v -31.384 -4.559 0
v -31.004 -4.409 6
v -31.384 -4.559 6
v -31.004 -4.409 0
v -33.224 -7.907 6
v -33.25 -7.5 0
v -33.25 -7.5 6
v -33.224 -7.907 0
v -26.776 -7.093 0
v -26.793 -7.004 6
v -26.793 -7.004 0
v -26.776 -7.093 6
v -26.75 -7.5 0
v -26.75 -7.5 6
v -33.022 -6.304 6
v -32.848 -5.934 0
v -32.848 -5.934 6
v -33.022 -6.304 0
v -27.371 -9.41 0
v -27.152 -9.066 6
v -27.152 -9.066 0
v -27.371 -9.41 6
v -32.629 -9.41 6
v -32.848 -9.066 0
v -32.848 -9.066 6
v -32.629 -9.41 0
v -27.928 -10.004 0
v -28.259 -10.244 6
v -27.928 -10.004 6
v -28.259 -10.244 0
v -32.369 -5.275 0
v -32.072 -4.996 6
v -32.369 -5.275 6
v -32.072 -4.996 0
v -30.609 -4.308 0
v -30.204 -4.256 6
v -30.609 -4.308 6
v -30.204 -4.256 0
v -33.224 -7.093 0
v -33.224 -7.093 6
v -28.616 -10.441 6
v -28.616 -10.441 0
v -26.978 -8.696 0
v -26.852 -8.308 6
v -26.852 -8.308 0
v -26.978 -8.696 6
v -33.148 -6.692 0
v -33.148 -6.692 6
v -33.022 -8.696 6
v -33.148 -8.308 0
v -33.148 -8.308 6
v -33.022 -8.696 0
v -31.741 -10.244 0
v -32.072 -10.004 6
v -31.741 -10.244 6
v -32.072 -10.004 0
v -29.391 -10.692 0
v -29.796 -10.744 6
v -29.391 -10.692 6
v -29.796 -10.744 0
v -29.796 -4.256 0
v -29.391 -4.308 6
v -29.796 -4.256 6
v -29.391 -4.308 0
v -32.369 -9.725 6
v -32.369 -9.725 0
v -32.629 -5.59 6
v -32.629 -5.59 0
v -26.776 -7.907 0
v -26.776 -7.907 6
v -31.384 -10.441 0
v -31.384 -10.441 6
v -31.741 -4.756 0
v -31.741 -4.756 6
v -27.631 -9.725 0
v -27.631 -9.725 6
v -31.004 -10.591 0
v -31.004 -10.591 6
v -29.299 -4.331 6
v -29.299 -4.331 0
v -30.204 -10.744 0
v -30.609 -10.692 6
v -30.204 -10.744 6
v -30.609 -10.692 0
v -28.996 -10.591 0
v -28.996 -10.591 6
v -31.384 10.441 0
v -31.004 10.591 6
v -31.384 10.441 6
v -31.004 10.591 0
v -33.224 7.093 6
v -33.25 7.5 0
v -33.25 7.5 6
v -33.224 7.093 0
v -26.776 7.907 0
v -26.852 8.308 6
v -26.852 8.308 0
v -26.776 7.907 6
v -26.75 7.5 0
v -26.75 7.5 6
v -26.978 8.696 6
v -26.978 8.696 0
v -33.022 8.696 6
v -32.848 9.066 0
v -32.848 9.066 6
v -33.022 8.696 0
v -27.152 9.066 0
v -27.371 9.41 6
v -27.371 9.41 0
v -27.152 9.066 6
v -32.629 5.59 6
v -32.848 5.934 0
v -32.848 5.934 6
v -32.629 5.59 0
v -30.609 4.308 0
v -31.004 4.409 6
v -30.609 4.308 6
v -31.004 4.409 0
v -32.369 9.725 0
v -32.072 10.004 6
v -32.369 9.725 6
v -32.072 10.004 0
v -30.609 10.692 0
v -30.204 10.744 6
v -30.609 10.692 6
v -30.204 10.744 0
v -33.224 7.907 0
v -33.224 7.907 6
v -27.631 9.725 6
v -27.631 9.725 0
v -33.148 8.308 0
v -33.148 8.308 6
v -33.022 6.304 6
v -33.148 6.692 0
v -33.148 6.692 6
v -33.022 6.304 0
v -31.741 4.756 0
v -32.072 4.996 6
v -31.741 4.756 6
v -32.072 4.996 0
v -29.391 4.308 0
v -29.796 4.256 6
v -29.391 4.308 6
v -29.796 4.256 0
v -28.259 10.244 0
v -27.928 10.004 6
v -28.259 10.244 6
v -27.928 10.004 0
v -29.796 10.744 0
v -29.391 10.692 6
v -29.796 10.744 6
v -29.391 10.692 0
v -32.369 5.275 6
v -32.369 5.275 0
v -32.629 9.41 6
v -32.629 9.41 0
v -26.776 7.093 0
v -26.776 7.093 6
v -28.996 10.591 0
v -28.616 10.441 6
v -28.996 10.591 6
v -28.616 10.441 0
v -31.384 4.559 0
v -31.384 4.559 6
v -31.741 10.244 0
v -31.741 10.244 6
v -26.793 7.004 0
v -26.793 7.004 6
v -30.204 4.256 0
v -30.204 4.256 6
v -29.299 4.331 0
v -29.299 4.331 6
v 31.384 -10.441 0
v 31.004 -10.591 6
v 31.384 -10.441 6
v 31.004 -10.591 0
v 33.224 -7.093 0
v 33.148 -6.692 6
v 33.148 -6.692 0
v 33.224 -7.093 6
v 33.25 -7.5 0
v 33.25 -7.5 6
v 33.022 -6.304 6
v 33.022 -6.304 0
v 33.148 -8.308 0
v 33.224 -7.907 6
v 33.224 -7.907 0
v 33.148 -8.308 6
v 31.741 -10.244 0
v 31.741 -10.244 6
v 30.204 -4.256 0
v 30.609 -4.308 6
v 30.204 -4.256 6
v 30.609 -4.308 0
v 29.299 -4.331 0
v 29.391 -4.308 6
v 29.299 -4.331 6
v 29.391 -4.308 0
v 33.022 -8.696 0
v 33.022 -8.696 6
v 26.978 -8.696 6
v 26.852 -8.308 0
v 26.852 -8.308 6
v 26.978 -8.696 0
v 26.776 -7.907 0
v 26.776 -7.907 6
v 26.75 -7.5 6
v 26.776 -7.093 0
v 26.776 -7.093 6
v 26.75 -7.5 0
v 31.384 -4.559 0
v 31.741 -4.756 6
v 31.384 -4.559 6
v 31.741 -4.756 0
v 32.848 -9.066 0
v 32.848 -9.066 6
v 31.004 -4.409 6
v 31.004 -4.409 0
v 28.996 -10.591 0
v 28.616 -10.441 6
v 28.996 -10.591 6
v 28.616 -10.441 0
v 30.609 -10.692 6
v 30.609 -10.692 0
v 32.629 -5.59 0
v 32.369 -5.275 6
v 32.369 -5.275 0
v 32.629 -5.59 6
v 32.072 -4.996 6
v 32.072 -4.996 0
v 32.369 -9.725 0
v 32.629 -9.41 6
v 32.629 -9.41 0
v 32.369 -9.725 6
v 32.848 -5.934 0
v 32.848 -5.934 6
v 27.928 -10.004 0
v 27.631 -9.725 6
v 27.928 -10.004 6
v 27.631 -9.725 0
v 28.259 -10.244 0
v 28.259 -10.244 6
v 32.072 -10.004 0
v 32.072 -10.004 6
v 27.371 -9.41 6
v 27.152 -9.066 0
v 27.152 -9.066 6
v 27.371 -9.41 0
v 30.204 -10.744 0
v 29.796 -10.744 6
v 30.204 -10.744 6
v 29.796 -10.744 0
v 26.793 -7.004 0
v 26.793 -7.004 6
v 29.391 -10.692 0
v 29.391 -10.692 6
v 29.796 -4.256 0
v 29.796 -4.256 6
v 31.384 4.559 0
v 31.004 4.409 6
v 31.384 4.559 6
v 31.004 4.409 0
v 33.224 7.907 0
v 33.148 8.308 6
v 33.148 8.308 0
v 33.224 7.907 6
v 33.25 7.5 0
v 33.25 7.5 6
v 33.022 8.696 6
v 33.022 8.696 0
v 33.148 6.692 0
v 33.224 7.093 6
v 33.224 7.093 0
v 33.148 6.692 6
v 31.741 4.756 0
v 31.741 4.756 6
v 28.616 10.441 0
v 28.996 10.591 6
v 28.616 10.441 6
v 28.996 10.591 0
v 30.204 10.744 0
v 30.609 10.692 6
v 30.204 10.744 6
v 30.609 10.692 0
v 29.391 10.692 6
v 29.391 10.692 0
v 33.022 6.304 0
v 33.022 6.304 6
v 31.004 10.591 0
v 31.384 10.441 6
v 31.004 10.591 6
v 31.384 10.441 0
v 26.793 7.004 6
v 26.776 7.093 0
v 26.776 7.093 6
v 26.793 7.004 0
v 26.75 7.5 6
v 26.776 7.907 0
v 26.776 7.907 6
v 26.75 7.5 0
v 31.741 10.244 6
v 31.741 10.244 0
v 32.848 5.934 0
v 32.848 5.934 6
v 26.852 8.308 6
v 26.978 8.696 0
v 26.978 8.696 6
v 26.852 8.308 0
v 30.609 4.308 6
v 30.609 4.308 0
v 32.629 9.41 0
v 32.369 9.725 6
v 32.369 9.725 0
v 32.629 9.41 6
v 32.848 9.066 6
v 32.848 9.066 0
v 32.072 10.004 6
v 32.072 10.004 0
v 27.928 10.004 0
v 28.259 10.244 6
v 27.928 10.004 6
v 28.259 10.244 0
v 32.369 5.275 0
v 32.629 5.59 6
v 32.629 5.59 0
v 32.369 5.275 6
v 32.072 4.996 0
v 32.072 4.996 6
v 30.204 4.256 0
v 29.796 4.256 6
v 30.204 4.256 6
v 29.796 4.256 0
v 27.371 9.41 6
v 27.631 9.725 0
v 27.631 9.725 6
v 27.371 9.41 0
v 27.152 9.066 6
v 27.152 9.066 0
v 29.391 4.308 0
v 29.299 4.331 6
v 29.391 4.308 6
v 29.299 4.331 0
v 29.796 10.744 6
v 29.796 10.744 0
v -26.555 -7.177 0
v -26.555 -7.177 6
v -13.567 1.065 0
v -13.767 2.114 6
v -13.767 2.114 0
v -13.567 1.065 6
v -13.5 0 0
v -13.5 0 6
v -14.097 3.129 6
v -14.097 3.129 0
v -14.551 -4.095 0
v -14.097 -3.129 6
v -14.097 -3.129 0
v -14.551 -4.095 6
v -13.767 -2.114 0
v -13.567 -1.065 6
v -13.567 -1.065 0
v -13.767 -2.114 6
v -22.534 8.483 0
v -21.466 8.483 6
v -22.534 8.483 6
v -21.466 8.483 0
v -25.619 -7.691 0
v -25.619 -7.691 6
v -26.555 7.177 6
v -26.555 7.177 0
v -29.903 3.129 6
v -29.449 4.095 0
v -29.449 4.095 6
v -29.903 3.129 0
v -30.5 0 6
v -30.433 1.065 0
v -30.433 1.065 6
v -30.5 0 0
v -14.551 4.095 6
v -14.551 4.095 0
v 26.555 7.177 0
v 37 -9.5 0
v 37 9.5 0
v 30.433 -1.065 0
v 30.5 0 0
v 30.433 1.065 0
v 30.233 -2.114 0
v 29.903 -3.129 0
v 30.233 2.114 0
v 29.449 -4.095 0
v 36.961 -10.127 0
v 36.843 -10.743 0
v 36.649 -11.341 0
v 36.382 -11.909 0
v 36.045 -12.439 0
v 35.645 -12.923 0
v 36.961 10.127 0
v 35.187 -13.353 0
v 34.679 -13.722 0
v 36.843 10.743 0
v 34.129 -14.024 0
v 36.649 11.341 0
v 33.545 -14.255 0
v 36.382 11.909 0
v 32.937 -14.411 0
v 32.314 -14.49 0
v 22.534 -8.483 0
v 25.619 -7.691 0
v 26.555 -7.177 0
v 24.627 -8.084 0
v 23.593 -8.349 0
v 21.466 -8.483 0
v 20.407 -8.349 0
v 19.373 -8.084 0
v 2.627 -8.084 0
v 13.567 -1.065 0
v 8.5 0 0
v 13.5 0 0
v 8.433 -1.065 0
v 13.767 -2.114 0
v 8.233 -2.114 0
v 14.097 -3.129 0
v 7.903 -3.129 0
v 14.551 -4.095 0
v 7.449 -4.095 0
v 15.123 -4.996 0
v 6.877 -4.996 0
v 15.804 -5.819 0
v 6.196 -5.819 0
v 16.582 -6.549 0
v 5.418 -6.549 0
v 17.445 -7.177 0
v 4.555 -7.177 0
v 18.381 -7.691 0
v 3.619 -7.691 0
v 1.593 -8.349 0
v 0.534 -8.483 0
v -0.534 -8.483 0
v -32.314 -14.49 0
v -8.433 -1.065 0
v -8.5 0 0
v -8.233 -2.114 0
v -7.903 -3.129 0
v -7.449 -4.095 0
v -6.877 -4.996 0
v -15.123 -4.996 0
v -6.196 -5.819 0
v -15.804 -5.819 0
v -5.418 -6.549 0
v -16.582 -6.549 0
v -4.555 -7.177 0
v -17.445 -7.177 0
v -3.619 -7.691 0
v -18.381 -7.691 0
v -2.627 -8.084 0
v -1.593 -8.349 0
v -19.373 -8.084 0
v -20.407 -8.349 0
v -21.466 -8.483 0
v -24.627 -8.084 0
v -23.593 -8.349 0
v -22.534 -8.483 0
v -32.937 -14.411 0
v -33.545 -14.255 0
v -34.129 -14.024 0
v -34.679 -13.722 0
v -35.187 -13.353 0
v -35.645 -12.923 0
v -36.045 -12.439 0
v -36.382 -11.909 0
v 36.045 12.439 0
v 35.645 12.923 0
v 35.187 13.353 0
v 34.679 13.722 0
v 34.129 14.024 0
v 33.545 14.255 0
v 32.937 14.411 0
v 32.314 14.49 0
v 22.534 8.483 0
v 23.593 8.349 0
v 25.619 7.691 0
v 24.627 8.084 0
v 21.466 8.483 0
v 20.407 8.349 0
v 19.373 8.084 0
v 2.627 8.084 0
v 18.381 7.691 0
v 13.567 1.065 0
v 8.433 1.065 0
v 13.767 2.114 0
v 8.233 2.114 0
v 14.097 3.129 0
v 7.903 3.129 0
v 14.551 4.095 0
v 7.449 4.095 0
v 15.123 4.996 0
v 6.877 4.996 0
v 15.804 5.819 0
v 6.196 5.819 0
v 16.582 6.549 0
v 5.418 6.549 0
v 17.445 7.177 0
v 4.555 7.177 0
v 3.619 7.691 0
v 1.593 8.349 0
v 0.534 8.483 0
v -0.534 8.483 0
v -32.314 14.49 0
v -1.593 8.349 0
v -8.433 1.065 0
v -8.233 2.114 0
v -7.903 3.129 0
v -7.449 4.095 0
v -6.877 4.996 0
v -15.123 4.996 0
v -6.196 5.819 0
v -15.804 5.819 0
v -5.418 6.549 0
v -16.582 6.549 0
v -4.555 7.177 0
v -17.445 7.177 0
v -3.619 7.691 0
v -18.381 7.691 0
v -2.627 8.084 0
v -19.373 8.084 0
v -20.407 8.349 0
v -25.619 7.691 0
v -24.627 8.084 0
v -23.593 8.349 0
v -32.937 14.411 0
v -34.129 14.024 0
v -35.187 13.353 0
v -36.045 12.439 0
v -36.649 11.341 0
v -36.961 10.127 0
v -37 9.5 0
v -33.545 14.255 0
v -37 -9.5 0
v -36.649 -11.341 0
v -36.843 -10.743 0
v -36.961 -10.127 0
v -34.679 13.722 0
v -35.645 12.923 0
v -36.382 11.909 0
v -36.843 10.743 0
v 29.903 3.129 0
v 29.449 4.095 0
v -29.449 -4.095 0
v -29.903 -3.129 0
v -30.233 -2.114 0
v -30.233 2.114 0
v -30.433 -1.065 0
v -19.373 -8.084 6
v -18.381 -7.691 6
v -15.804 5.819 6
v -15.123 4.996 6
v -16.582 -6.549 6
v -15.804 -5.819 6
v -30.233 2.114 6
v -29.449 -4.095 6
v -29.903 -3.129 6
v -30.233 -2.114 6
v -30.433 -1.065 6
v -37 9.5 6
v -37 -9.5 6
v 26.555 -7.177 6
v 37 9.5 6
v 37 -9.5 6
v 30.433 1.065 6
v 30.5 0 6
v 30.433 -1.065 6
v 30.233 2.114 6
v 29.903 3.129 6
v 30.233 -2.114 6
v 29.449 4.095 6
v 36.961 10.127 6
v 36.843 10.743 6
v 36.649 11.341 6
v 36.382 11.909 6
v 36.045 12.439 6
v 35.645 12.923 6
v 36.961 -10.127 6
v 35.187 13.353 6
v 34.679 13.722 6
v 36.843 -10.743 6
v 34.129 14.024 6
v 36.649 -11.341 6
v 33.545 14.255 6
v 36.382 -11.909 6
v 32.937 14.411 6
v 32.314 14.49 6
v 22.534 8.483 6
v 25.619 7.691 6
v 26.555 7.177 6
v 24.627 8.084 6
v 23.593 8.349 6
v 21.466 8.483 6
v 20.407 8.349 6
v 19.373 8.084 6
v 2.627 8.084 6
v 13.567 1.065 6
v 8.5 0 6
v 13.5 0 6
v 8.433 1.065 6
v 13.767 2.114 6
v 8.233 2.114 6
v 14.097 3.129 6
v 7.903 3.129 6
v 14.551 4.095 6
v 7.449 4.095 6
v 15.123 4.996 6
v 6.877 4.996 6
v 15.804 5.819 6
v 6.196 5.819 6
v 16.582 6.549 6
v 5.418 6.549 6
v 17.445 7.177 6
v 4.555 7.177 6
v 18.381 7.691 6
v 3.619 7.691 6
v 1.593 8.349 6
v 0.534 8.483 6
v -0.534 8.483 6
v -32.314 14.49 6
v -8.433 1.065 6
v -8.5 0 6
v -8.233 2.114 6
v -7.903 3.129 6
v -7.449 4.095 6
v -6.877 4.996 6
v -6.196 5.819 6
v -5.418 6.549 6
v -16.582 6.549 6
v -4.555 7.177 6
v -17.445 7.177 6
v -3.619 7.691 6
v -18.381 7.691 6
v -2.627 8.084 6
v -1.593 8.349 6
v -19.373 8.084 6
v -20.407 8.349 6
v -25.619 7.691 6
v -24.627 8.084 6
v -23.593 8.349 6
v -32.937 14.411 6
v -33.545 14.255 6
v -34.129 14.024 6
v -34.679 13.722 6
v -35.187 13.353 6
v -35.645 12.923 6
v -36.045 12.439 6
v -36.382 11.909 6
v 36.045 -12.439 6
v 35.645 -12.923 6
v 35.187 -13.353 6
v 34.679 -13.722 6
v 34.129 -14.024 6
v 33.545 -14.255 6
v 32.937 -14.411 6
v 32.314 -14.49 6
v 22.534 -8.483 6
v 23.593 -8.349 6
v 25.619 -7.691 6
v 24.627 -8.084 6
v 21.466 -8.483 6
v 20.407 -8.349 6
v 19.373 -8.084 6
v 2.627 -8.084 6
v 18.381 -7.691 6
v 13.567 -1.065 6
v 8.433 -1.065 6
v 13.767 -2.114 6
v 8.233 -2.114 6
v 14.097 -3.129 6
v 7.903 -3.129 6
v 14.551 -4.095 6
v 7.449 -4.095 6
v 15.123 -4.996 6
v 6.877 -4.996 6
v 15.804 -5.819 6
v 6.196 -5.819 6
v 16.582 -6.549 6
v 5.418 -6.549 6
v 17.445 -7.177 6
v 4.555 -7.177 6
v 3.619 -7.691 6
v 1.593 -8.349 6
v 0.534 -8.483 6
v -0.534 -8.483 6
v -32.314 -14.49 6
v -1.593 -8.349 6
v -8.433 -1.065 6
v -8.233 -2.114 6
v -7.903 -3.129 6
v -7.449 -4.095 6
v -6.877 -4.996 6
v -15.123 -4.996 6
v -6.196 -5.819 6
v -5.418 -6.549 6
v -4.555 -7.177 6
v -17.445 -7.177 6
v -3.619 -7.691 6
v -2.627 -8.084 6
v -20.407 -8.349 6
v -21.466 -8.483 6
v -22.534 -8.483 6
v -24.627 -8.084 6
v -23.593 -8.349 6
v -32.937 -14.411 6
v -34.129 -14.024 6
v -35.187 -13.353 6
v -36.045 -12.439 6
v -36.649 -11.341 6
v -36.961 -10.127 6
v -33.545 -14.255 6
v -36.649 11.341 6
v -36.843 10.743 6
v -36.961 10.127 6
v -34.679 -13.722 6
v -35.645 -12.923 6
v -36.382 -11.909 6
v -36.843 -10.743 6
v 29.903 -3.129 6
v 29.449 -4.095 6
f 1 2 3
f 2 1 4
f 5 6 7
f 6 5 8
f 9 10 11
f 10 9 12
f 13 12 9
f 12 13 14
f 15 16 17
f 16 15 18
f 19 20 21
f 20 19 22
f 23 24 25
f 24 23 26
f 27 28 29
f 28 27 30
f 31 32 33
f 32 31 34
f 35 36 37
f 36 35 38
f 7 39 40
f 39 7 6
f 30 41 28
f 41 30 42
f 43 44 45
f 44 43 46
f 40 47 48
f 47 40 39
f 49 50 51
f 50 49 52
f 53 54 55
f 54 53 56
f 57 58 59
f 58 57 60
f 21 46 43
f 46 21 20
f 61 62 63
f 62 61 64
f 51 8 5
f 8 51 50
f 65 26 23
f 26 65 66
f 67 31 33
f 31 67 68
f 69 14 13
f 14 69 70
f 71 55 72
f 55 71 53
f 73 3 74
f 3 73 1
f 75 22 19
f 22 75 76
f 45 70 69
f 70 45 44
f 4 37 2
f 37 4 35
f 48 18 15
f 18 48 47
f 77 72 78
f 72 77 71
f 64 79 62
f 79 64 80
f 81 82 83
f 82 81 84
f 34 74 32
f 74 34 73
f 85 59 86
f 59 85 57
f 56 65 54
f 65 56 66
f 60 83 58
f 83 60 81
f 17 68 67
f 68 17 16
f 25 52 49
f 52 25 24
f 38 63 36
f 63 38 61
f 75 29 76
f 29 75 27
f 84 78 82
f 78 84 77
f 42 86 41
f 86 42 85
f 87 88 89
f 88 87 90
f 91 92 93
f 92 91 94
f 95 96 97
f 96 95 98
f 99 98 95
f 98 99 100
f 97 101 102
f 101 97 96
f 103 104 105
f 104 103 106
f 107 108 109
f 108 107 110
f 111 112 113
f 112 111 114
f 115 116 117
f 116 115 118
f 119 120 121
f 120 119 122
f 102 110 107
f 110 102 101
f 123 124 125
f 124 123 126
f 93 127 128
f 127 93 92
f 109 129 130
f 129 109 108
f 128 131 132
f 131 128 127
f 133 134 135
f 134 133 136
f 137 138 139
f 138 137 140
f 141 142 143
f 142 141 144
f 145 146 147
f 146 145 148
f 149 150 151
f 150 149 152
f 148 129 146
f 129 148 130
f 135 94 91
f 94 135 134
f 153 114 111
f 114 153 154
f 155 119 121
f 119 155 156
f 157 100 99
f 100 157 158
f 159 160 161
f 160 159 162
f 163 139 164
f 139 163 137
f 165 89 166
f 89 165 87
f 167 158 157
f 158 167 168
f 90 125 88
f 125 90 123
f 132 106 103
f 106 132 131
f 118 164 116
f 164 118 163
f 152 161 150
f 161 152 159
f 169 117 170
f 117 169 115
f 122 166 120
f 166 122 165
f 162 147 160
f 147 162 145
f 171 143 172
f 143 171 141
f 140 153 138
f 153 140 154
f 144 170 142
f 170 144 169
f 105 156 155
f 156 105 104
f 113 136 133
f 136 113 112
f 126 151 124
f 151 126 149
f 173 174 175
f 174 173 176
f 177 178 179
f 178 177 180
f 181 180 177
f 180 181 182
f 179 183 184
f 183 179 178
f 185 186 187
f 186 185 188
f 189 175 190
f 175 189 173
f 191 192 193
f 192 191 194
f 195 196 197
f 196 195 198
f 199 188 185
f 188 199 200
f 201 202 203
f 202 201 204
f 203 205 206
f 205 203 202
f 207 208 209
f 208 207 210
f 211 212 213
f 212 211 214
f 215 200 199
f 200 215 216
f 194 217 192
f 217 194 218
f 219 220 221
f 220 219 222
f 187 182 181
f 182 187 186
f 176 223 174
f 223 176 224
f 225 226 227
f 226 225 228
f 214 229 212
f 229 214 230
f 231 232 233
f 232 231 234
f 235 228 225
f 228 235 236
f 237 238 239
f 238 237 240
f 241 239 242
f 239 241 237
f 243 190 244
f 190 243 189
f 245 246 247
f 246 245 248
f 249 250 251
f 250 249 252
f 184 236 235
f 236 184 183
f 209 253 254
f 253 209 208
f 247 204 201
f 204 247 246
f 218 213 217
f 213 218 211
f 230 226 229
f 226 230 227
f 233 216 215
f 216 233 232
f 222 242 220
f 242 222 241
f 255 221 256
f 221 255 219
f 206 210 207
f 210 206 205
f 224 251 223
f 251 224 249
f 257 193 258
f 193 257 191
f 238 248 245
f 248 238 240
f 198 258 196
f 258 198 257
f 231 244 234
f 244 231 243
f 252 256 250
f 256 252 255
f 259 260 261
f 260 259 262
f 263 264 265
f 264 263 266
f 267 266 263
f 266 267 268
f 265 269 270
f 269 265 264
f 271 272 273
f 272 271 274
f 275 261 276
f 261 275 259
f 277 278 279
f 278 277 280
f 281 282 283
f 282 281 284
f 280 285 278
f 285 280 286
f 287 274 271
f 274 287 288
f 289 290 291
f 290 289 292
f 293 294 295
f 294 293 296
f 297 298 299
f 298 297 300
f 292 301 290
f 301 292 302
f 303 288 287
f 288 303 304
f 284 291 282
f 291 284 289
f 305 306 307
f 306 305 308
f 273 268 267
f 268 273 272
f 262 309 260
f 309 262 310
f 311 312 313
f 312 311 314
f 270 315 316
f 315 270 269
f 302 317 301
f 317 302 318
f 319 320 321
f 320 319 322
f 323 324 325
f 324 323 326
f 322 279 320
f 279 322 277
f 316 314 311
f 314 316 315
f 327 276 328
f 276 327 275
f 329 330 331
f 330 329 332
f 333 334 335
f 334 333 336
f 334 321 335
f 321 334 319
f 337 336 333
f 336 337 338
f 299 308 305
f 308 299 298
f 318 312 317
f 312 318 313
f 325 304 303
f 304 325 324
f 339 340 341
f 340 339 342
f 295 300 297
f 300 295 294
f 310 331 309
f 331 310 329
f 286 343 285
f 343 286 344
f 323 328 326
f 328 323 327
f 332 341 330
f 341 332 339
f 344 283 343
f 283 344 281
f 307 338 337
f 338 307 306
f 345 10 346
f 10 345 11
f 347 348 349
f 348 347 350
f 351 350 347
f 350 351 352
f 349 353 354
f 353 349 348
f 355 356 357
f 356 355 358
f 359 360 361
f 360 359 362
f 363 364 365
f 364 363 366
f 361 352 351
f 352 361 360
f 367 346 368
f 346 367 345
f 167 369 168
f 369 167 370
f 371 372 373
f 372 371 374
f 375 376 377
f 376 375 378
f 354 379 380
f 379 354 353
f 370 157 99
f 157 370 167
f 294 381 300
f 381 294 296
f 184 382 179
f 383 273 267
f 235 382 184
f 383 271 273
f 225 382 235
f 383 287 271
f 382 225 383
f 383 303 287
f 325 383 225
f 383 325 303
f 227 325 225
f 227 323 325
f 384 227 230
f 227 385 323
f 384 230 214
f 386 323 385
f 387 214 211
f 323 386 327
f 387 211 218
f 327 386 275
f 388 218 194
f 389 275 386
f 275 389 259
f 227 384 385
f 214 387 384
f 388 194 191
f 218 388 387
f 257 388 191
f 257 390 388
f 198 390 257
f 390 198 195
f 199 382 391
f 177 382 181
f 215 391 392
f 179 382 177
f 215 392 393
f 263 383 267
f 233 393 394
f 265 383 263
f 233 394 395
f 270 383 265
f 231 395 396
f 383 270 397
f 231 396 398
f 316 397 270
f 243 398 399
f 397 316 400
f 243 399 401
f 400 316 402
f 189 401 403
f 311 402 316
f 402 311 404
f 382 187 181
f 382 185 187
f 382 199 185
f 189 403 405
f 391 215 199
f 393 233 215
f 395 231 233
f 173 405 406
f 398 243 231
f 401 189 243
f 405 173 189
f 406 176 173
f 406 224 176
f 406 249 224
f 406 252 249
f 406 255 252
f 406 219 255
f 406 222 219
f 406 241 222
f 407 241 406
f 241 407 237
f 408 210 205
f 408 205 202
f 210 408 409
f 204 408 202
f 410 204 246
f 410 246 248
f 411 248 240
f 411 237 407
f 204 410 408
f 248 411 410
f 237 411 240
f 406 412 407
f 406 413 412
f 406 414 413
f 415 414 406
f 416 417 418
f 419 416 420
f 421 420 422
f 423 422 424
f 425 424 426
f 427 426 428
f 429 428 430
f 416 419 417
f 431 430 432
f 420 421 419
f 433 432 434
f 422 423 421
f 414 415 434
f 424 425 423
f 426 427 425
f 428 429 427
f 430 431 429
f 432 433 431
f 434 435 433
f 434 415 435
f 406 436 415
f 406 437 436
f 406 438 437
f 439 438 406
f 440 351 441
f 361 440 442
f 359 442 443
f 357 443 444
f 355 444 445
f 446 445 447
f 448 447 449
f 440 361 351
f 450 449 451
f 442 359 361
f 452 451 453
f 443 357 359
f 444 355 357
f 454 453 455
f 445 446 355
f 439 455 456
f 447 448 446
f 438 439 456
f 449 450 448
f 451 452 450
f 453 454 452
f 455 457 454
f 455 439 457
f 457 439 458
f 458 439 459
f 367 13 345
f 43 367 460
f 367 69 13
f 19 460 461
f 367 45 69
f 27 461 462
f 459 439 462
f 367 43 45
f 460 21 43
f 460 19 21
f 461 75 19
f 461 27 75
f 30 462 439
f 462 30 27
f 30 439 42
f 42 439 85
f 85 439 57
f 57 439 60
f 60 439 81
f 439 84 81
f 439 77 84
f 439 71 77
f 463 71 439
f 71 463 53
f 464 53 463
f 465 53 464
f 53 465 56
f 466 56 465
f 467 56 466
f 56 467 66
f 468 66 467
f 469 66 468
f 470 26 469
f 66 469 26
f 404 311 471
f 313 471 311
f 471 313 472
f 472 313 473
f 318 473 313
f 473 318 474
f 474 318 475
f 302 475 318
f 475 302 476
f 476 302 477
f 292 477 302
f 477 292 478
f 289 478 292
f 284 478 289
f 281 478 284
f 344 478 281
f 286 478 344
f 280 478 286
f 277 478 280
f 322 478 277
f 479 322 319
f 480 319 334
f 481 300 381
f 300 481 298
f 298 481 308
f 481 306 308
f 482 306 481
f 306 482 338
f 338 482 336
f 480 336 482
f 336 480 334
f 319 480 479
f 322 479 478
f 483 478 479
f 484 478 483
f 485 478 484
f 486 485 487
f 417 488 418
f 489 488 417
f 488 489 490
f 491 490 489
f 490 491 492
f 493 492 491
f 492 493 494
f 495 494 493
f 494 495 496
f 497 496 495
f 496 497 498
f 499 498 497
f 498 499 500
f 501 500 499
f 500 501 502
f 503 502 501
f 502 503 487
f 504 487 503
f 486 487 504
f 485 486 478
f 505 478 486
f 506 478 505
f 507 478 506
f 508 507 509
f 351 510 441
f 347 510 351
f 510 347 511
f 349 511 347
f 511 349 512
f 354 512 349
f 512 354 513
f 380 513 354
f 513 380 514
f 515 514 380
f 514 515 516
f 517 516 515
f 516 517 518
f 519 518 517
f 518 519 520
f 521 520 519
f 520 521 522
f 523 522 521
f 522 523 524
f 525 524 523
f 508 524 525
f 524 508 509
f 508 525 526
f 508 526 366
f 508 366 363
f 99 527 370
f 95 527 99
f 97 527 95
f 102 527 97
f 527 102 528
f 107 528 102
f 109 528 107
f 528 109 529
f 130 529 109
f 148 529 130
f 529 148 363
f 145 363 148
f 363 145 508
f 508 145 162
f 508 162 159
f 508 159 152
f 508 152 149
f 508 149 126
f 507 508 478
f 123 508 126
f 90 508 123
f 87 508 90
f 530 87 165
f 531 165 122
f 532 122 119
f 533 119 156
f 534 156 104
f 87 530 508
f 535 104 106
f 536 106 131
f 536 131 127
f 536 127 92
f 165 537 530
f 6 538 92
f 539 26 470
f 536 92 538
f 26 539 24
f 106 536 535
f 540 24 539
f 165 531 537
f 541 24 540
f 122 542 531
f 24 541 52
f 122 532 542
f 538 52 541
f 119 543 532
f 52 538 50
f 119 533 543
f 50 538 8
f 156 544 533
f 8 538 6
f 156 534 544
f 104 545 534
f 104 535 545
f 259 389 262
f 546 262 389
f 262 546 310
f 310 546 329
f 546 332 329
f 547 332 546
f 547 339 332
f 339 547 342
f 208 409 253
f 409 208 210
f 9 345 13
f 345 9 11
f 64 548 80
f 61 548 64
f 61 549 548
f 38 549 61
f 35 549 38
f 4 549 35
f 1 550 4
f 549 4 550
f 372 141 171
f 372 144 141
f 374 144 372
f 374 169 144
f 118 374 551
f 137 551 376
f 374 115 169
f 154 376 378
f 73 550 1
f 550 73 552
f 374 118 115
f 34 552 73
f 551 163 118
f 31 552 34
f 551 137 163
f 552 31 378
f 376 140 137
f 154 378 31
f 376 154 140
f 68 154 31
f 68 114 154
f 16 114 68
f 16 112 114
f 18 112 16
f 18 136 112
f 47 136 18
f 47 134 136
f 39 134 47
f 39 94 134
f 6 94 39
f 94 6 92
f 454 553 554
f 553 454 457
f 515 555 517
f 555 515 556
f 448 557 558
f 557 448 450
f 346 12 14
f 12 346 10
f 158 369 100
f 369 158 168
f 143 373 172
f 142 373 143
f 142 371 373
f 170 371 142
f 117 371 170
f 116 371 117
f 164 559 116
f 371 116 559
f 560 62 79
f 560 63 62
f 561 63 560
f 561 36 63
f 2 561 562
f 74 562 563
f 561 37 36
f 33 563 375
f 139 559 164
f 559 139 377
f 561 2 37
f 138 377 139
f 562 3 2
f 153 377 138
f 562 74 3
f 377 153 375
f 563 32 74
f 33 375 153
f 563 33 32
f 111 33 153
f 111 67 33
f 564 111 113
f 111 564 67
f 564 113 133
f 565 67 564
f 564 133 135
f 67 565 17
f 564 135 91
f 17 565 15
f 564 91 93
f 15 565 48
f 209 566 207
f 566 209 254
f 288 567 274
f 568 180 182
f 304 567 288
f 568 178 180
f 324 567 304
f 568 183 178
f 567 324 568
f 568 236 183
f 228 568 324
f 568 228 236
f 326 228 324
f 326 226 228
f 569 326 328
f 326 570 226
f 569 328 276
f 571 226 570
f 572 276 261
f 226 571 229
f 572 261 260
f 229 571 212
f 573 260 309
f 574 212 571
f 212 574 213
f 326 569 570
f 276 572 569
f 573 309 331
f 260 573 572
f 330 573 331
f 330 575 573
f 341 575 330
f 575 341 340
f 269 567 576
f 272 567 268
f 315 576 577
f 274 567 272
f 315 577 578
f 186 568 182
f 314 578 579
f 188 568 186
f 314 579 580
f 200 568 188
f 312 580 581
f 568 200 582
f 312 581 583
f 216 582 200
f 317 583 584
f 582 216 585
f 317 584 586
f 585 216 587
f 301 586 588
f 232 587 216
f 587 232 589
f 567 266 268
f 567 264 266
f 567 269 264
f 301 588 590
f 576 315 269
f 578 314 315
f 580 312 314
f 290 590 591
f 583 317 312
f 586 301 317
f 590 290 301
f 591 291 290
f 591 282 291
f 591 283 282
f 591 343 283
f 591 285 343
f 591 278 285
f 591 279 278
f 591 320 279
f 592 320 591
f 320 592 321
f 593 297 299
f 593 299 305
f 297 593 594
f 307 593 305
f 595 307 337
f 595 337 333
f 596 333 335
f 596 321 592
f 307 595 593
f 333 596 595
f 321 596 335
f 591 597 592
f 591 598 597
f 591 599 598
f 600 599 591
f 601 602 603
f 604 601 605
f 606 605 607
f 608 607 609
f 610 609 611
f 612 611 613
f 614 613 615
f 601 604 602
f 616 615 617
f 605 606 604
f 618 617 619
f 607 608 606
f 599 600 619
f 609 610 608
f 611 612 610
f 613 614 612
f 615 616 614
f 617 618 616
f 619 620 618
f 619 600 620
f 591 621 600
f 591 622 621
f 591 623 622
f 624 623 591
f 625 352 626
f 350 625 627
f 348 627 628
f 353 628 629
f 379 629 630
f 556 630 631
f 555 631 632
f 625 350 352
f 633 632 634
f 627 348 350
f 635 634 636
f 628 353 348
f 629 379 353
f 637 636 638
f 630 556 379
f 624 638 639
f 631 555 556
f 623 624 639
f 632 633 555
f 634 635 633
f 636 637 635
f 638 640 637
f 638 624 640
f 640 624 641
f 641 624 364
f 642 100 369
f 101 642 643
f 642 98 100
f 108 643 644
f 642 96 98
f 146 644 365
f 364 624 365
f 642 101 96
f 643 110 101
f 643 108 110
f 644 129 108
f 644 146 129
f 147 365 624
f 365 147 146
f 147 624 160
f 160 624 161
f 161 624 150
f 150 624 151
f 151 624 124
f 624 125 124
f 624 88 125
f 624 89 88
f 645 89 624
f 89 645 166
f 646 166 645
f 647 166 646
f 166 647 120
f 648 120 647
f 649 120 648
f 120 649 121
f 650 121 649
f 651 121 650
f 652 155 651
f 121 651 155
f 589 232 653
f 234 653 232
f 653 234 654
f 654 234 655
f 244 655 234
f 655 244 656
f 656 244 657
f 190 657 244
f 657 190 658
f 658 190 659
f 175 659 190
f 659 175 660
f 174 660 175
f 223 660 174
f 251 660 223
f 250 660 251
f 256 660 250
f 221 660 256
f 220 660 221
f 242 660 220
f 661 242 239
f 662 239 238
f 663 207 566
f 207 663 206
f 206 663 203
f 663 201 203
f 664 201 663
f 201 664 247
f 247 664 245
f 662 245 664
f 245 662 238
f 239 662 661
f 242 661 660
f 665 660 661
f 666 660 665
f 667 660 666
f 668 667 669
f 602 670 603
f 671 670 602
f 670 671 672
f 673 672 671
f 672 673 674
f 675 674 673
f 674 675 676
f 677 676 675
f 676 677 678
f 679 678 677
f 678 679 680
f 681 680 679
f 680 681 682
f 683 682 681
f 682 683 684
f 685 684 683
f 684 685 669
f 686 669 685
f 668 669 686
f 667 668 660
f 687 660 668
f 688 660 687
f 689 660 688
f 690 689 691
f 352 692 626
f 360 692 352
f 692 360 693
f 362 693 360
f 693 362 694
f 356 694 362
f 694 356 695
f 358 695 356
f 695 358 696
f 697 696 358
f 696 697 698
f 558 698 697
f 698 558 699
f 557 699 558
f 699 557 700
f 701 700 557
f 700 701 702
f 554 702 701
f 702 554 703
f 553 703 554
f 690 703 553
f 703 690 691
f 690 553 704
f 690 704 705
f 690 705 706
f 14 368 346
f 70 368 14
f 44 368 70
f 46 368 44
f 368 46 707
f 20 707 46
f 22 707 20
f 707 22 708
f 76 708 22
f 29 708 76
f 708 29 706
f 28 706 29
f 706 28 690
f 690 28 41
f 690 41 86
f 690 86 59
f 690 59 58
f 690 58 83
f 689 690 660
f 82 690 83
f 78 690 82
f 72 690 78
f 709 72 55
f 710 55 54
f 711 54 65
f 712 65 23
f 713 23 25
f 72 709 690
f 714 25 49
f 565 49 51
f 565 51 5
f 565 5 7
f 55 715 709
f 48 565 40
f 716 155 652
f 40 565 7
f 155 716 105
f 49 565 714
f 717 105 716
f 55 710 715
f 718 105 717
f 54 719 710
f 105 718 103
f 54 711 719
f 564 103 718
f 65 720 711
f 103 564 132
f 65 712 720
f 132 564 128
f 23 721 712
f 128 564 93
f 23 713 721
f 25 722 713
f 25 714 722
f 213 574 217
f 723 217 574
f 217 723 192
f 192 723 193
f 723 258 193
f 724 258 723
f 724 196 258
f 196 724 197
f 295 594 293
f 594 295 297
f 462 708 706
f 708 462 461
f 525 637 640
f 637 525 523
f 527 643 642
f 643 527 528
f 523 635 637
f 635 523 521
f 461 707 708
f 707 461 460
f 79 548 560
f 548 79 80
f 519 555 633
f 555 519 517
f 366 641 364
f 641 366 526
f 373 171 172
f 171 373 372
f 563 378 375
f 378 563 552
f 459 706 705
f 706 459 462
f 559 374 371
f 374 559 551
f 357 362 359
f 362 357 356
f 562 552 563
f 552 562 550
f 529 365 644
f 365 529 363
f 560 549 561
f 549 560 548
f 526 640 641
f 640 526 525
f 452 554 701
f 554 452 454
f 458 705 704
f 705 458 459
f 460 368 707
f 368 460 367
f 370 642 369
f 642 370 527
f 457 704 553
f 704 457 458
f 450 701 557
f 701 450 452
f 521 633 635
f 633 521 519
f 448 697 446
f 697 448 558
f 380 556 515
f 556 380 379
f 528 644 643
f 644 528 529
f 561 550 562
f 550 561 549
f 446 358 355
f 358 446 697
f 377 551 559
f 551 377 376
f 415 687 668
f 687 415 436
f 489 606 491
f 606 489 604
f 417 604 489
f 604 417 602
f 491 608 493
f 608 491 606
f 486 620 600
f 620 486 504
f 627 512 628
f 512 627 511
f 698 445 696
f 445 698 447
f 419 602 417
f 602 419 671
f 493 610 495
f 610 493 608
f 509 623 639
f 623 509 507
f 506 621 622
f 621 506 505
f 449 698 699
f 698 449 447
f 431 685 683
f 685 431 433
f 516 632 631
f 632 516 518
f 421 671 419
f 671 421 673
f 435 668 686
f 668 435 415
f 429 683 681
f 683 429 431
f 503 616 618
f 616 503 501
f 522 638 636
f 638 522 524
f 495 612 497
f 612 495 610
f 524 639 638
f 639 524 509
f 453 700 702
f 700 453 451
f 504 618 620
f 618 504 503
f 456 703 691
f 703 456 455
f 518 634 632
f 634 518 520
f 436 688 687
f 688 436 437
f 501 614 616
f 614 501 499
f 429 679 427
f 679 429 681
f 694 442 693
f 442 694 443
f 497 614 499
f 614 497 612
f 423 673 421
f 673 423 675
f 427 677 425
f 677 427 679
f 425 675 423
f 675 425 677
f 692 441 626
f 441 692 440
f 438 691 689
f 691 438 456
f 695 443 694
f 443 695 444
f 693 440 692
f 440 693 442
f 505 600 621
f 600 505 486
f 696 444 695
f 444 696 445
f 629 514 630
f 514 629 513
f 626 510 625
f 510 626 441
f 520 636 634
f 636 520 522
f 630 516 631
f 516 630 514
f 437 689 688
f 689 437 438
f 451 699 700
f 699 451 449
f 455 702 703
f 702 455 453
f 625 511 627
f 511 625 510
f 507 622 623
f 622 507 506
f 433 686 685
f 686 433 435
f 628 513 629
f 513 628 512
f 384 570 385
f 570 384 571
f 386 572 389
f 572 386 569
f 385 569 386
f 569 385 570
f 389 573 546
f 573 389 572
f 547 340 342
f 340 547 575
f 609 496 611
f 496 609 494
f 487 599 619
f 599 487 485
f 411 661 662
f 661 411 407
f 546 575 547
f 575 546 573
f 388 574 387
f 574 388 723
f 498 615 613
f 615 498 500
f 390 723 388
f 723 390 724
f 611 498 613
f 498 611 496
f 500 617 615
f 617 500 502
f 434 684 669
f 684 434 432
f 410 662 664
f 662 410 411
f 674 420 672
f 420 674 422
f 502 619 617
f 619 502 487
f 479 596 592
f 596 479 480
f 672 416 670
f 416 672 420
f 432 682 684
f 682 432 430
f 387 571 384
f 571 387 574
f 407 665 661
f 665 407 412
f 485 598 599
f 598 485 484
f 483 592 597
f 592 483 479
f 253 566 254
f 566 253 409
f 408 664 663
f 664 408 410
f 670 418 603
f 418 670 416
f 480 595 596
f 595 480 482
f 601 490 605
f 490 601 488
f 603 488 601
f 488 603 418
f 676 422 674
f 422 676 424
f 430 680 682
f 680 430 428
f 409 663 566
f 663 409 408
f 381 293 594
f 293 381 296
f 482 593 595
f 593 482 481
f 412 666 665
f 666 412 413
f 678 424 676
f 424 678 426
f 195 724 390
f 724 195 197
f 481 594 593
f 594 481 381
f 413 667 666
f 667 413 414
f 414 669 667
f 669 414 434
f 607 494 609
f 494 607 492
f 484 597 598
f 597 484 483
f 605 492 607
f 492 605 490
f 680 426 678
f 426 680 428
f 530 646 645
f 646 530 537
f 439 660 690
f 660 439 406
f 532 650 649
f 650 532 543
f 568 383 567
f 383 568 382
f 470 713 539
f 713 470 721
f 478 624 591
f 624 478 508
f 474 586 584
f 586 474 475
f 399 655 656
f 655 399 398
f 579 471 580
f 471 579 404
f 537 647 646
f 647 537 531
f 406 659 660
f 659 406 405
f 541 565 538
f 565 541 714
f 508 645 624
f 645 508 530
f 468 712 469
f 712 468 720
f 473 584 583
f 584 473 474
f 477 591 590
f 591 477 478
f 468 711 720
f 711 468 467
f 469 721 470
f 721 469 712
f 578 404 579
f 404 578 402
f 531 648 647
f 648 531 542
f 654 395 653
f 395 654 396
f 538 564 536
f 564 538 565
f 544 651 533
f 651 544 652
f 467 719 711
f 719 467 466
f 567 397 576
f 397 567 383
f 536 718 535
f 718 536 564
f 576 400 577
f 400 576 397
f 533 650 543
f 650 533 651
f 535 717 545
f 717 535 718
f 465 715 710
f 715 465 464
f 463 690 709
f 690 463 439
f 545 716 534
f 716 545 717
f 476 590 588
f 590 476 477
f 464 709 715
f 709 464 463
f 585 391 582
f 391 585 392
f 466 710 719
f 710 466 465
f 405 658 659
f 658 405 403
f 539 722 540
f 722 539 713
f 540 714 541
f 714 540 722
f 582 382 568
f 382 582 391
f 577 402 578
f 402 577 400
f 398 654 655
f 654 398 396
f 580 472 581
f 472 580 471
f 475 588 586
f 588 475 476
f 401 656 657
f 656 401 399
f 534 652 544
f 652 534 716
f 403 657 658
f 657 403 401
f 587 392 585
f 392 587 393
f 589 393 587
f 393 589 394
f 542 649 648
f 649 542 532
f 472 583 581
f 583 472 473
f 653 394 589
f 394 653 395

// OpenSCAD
$fn = 50;


difference() {
	union() {
		hull() {
			translate(v = [-32.0000000000, 9.5000000000, 0]) {
				cylinder(h = 6, r = 5);
			}
			translate(v = [32.0000000000, 9.5000000000, 0]) {
				cylinder(h = 6, r = 5);
			}
			translate(v = [-32.0000000000, -9.5000000000, 0]) {
				cylinder(h = 6, r = 5);
			}
			translate(v = [32.0000000000, -9.5000000000, 0]) {
				cylinder(h = 6, r = 5);
			}
		}
	}
	union() {
		#translate(v = [-30.0000000000, -7.5000000000, -100.0000000000]) {
			cylinder(h = 200, r = 3.2500000000);
		}
		#translate(v = [-30.0000000000, 7.5000000000, -100.0000000000]) {
			cylinder(h = 200, r = 3.2500000000);
		}
		#translate(v = [30.0000000000, -7.5000000000, -100.0000000000]) {
			cylinder(h = 200, r = 3.2500000000);
		}
		#translate(v = [30.0000000000, 7.5000000000, -100.0000000000]) {
			cylinder(h = 200, r = 3.2500000000);
		}
		#translate(v = [-22.0000000000, 0, 0]) {
			cylinder(h = 6, r = 8.5000000000);
		}
		#cylinder(h = 6, r = 8.5000000000);
		#translate(v = [22.0000000000, 0, 0]) {
			cylinder(h = 6, r = 8.5000000000);
		}
	}
}
